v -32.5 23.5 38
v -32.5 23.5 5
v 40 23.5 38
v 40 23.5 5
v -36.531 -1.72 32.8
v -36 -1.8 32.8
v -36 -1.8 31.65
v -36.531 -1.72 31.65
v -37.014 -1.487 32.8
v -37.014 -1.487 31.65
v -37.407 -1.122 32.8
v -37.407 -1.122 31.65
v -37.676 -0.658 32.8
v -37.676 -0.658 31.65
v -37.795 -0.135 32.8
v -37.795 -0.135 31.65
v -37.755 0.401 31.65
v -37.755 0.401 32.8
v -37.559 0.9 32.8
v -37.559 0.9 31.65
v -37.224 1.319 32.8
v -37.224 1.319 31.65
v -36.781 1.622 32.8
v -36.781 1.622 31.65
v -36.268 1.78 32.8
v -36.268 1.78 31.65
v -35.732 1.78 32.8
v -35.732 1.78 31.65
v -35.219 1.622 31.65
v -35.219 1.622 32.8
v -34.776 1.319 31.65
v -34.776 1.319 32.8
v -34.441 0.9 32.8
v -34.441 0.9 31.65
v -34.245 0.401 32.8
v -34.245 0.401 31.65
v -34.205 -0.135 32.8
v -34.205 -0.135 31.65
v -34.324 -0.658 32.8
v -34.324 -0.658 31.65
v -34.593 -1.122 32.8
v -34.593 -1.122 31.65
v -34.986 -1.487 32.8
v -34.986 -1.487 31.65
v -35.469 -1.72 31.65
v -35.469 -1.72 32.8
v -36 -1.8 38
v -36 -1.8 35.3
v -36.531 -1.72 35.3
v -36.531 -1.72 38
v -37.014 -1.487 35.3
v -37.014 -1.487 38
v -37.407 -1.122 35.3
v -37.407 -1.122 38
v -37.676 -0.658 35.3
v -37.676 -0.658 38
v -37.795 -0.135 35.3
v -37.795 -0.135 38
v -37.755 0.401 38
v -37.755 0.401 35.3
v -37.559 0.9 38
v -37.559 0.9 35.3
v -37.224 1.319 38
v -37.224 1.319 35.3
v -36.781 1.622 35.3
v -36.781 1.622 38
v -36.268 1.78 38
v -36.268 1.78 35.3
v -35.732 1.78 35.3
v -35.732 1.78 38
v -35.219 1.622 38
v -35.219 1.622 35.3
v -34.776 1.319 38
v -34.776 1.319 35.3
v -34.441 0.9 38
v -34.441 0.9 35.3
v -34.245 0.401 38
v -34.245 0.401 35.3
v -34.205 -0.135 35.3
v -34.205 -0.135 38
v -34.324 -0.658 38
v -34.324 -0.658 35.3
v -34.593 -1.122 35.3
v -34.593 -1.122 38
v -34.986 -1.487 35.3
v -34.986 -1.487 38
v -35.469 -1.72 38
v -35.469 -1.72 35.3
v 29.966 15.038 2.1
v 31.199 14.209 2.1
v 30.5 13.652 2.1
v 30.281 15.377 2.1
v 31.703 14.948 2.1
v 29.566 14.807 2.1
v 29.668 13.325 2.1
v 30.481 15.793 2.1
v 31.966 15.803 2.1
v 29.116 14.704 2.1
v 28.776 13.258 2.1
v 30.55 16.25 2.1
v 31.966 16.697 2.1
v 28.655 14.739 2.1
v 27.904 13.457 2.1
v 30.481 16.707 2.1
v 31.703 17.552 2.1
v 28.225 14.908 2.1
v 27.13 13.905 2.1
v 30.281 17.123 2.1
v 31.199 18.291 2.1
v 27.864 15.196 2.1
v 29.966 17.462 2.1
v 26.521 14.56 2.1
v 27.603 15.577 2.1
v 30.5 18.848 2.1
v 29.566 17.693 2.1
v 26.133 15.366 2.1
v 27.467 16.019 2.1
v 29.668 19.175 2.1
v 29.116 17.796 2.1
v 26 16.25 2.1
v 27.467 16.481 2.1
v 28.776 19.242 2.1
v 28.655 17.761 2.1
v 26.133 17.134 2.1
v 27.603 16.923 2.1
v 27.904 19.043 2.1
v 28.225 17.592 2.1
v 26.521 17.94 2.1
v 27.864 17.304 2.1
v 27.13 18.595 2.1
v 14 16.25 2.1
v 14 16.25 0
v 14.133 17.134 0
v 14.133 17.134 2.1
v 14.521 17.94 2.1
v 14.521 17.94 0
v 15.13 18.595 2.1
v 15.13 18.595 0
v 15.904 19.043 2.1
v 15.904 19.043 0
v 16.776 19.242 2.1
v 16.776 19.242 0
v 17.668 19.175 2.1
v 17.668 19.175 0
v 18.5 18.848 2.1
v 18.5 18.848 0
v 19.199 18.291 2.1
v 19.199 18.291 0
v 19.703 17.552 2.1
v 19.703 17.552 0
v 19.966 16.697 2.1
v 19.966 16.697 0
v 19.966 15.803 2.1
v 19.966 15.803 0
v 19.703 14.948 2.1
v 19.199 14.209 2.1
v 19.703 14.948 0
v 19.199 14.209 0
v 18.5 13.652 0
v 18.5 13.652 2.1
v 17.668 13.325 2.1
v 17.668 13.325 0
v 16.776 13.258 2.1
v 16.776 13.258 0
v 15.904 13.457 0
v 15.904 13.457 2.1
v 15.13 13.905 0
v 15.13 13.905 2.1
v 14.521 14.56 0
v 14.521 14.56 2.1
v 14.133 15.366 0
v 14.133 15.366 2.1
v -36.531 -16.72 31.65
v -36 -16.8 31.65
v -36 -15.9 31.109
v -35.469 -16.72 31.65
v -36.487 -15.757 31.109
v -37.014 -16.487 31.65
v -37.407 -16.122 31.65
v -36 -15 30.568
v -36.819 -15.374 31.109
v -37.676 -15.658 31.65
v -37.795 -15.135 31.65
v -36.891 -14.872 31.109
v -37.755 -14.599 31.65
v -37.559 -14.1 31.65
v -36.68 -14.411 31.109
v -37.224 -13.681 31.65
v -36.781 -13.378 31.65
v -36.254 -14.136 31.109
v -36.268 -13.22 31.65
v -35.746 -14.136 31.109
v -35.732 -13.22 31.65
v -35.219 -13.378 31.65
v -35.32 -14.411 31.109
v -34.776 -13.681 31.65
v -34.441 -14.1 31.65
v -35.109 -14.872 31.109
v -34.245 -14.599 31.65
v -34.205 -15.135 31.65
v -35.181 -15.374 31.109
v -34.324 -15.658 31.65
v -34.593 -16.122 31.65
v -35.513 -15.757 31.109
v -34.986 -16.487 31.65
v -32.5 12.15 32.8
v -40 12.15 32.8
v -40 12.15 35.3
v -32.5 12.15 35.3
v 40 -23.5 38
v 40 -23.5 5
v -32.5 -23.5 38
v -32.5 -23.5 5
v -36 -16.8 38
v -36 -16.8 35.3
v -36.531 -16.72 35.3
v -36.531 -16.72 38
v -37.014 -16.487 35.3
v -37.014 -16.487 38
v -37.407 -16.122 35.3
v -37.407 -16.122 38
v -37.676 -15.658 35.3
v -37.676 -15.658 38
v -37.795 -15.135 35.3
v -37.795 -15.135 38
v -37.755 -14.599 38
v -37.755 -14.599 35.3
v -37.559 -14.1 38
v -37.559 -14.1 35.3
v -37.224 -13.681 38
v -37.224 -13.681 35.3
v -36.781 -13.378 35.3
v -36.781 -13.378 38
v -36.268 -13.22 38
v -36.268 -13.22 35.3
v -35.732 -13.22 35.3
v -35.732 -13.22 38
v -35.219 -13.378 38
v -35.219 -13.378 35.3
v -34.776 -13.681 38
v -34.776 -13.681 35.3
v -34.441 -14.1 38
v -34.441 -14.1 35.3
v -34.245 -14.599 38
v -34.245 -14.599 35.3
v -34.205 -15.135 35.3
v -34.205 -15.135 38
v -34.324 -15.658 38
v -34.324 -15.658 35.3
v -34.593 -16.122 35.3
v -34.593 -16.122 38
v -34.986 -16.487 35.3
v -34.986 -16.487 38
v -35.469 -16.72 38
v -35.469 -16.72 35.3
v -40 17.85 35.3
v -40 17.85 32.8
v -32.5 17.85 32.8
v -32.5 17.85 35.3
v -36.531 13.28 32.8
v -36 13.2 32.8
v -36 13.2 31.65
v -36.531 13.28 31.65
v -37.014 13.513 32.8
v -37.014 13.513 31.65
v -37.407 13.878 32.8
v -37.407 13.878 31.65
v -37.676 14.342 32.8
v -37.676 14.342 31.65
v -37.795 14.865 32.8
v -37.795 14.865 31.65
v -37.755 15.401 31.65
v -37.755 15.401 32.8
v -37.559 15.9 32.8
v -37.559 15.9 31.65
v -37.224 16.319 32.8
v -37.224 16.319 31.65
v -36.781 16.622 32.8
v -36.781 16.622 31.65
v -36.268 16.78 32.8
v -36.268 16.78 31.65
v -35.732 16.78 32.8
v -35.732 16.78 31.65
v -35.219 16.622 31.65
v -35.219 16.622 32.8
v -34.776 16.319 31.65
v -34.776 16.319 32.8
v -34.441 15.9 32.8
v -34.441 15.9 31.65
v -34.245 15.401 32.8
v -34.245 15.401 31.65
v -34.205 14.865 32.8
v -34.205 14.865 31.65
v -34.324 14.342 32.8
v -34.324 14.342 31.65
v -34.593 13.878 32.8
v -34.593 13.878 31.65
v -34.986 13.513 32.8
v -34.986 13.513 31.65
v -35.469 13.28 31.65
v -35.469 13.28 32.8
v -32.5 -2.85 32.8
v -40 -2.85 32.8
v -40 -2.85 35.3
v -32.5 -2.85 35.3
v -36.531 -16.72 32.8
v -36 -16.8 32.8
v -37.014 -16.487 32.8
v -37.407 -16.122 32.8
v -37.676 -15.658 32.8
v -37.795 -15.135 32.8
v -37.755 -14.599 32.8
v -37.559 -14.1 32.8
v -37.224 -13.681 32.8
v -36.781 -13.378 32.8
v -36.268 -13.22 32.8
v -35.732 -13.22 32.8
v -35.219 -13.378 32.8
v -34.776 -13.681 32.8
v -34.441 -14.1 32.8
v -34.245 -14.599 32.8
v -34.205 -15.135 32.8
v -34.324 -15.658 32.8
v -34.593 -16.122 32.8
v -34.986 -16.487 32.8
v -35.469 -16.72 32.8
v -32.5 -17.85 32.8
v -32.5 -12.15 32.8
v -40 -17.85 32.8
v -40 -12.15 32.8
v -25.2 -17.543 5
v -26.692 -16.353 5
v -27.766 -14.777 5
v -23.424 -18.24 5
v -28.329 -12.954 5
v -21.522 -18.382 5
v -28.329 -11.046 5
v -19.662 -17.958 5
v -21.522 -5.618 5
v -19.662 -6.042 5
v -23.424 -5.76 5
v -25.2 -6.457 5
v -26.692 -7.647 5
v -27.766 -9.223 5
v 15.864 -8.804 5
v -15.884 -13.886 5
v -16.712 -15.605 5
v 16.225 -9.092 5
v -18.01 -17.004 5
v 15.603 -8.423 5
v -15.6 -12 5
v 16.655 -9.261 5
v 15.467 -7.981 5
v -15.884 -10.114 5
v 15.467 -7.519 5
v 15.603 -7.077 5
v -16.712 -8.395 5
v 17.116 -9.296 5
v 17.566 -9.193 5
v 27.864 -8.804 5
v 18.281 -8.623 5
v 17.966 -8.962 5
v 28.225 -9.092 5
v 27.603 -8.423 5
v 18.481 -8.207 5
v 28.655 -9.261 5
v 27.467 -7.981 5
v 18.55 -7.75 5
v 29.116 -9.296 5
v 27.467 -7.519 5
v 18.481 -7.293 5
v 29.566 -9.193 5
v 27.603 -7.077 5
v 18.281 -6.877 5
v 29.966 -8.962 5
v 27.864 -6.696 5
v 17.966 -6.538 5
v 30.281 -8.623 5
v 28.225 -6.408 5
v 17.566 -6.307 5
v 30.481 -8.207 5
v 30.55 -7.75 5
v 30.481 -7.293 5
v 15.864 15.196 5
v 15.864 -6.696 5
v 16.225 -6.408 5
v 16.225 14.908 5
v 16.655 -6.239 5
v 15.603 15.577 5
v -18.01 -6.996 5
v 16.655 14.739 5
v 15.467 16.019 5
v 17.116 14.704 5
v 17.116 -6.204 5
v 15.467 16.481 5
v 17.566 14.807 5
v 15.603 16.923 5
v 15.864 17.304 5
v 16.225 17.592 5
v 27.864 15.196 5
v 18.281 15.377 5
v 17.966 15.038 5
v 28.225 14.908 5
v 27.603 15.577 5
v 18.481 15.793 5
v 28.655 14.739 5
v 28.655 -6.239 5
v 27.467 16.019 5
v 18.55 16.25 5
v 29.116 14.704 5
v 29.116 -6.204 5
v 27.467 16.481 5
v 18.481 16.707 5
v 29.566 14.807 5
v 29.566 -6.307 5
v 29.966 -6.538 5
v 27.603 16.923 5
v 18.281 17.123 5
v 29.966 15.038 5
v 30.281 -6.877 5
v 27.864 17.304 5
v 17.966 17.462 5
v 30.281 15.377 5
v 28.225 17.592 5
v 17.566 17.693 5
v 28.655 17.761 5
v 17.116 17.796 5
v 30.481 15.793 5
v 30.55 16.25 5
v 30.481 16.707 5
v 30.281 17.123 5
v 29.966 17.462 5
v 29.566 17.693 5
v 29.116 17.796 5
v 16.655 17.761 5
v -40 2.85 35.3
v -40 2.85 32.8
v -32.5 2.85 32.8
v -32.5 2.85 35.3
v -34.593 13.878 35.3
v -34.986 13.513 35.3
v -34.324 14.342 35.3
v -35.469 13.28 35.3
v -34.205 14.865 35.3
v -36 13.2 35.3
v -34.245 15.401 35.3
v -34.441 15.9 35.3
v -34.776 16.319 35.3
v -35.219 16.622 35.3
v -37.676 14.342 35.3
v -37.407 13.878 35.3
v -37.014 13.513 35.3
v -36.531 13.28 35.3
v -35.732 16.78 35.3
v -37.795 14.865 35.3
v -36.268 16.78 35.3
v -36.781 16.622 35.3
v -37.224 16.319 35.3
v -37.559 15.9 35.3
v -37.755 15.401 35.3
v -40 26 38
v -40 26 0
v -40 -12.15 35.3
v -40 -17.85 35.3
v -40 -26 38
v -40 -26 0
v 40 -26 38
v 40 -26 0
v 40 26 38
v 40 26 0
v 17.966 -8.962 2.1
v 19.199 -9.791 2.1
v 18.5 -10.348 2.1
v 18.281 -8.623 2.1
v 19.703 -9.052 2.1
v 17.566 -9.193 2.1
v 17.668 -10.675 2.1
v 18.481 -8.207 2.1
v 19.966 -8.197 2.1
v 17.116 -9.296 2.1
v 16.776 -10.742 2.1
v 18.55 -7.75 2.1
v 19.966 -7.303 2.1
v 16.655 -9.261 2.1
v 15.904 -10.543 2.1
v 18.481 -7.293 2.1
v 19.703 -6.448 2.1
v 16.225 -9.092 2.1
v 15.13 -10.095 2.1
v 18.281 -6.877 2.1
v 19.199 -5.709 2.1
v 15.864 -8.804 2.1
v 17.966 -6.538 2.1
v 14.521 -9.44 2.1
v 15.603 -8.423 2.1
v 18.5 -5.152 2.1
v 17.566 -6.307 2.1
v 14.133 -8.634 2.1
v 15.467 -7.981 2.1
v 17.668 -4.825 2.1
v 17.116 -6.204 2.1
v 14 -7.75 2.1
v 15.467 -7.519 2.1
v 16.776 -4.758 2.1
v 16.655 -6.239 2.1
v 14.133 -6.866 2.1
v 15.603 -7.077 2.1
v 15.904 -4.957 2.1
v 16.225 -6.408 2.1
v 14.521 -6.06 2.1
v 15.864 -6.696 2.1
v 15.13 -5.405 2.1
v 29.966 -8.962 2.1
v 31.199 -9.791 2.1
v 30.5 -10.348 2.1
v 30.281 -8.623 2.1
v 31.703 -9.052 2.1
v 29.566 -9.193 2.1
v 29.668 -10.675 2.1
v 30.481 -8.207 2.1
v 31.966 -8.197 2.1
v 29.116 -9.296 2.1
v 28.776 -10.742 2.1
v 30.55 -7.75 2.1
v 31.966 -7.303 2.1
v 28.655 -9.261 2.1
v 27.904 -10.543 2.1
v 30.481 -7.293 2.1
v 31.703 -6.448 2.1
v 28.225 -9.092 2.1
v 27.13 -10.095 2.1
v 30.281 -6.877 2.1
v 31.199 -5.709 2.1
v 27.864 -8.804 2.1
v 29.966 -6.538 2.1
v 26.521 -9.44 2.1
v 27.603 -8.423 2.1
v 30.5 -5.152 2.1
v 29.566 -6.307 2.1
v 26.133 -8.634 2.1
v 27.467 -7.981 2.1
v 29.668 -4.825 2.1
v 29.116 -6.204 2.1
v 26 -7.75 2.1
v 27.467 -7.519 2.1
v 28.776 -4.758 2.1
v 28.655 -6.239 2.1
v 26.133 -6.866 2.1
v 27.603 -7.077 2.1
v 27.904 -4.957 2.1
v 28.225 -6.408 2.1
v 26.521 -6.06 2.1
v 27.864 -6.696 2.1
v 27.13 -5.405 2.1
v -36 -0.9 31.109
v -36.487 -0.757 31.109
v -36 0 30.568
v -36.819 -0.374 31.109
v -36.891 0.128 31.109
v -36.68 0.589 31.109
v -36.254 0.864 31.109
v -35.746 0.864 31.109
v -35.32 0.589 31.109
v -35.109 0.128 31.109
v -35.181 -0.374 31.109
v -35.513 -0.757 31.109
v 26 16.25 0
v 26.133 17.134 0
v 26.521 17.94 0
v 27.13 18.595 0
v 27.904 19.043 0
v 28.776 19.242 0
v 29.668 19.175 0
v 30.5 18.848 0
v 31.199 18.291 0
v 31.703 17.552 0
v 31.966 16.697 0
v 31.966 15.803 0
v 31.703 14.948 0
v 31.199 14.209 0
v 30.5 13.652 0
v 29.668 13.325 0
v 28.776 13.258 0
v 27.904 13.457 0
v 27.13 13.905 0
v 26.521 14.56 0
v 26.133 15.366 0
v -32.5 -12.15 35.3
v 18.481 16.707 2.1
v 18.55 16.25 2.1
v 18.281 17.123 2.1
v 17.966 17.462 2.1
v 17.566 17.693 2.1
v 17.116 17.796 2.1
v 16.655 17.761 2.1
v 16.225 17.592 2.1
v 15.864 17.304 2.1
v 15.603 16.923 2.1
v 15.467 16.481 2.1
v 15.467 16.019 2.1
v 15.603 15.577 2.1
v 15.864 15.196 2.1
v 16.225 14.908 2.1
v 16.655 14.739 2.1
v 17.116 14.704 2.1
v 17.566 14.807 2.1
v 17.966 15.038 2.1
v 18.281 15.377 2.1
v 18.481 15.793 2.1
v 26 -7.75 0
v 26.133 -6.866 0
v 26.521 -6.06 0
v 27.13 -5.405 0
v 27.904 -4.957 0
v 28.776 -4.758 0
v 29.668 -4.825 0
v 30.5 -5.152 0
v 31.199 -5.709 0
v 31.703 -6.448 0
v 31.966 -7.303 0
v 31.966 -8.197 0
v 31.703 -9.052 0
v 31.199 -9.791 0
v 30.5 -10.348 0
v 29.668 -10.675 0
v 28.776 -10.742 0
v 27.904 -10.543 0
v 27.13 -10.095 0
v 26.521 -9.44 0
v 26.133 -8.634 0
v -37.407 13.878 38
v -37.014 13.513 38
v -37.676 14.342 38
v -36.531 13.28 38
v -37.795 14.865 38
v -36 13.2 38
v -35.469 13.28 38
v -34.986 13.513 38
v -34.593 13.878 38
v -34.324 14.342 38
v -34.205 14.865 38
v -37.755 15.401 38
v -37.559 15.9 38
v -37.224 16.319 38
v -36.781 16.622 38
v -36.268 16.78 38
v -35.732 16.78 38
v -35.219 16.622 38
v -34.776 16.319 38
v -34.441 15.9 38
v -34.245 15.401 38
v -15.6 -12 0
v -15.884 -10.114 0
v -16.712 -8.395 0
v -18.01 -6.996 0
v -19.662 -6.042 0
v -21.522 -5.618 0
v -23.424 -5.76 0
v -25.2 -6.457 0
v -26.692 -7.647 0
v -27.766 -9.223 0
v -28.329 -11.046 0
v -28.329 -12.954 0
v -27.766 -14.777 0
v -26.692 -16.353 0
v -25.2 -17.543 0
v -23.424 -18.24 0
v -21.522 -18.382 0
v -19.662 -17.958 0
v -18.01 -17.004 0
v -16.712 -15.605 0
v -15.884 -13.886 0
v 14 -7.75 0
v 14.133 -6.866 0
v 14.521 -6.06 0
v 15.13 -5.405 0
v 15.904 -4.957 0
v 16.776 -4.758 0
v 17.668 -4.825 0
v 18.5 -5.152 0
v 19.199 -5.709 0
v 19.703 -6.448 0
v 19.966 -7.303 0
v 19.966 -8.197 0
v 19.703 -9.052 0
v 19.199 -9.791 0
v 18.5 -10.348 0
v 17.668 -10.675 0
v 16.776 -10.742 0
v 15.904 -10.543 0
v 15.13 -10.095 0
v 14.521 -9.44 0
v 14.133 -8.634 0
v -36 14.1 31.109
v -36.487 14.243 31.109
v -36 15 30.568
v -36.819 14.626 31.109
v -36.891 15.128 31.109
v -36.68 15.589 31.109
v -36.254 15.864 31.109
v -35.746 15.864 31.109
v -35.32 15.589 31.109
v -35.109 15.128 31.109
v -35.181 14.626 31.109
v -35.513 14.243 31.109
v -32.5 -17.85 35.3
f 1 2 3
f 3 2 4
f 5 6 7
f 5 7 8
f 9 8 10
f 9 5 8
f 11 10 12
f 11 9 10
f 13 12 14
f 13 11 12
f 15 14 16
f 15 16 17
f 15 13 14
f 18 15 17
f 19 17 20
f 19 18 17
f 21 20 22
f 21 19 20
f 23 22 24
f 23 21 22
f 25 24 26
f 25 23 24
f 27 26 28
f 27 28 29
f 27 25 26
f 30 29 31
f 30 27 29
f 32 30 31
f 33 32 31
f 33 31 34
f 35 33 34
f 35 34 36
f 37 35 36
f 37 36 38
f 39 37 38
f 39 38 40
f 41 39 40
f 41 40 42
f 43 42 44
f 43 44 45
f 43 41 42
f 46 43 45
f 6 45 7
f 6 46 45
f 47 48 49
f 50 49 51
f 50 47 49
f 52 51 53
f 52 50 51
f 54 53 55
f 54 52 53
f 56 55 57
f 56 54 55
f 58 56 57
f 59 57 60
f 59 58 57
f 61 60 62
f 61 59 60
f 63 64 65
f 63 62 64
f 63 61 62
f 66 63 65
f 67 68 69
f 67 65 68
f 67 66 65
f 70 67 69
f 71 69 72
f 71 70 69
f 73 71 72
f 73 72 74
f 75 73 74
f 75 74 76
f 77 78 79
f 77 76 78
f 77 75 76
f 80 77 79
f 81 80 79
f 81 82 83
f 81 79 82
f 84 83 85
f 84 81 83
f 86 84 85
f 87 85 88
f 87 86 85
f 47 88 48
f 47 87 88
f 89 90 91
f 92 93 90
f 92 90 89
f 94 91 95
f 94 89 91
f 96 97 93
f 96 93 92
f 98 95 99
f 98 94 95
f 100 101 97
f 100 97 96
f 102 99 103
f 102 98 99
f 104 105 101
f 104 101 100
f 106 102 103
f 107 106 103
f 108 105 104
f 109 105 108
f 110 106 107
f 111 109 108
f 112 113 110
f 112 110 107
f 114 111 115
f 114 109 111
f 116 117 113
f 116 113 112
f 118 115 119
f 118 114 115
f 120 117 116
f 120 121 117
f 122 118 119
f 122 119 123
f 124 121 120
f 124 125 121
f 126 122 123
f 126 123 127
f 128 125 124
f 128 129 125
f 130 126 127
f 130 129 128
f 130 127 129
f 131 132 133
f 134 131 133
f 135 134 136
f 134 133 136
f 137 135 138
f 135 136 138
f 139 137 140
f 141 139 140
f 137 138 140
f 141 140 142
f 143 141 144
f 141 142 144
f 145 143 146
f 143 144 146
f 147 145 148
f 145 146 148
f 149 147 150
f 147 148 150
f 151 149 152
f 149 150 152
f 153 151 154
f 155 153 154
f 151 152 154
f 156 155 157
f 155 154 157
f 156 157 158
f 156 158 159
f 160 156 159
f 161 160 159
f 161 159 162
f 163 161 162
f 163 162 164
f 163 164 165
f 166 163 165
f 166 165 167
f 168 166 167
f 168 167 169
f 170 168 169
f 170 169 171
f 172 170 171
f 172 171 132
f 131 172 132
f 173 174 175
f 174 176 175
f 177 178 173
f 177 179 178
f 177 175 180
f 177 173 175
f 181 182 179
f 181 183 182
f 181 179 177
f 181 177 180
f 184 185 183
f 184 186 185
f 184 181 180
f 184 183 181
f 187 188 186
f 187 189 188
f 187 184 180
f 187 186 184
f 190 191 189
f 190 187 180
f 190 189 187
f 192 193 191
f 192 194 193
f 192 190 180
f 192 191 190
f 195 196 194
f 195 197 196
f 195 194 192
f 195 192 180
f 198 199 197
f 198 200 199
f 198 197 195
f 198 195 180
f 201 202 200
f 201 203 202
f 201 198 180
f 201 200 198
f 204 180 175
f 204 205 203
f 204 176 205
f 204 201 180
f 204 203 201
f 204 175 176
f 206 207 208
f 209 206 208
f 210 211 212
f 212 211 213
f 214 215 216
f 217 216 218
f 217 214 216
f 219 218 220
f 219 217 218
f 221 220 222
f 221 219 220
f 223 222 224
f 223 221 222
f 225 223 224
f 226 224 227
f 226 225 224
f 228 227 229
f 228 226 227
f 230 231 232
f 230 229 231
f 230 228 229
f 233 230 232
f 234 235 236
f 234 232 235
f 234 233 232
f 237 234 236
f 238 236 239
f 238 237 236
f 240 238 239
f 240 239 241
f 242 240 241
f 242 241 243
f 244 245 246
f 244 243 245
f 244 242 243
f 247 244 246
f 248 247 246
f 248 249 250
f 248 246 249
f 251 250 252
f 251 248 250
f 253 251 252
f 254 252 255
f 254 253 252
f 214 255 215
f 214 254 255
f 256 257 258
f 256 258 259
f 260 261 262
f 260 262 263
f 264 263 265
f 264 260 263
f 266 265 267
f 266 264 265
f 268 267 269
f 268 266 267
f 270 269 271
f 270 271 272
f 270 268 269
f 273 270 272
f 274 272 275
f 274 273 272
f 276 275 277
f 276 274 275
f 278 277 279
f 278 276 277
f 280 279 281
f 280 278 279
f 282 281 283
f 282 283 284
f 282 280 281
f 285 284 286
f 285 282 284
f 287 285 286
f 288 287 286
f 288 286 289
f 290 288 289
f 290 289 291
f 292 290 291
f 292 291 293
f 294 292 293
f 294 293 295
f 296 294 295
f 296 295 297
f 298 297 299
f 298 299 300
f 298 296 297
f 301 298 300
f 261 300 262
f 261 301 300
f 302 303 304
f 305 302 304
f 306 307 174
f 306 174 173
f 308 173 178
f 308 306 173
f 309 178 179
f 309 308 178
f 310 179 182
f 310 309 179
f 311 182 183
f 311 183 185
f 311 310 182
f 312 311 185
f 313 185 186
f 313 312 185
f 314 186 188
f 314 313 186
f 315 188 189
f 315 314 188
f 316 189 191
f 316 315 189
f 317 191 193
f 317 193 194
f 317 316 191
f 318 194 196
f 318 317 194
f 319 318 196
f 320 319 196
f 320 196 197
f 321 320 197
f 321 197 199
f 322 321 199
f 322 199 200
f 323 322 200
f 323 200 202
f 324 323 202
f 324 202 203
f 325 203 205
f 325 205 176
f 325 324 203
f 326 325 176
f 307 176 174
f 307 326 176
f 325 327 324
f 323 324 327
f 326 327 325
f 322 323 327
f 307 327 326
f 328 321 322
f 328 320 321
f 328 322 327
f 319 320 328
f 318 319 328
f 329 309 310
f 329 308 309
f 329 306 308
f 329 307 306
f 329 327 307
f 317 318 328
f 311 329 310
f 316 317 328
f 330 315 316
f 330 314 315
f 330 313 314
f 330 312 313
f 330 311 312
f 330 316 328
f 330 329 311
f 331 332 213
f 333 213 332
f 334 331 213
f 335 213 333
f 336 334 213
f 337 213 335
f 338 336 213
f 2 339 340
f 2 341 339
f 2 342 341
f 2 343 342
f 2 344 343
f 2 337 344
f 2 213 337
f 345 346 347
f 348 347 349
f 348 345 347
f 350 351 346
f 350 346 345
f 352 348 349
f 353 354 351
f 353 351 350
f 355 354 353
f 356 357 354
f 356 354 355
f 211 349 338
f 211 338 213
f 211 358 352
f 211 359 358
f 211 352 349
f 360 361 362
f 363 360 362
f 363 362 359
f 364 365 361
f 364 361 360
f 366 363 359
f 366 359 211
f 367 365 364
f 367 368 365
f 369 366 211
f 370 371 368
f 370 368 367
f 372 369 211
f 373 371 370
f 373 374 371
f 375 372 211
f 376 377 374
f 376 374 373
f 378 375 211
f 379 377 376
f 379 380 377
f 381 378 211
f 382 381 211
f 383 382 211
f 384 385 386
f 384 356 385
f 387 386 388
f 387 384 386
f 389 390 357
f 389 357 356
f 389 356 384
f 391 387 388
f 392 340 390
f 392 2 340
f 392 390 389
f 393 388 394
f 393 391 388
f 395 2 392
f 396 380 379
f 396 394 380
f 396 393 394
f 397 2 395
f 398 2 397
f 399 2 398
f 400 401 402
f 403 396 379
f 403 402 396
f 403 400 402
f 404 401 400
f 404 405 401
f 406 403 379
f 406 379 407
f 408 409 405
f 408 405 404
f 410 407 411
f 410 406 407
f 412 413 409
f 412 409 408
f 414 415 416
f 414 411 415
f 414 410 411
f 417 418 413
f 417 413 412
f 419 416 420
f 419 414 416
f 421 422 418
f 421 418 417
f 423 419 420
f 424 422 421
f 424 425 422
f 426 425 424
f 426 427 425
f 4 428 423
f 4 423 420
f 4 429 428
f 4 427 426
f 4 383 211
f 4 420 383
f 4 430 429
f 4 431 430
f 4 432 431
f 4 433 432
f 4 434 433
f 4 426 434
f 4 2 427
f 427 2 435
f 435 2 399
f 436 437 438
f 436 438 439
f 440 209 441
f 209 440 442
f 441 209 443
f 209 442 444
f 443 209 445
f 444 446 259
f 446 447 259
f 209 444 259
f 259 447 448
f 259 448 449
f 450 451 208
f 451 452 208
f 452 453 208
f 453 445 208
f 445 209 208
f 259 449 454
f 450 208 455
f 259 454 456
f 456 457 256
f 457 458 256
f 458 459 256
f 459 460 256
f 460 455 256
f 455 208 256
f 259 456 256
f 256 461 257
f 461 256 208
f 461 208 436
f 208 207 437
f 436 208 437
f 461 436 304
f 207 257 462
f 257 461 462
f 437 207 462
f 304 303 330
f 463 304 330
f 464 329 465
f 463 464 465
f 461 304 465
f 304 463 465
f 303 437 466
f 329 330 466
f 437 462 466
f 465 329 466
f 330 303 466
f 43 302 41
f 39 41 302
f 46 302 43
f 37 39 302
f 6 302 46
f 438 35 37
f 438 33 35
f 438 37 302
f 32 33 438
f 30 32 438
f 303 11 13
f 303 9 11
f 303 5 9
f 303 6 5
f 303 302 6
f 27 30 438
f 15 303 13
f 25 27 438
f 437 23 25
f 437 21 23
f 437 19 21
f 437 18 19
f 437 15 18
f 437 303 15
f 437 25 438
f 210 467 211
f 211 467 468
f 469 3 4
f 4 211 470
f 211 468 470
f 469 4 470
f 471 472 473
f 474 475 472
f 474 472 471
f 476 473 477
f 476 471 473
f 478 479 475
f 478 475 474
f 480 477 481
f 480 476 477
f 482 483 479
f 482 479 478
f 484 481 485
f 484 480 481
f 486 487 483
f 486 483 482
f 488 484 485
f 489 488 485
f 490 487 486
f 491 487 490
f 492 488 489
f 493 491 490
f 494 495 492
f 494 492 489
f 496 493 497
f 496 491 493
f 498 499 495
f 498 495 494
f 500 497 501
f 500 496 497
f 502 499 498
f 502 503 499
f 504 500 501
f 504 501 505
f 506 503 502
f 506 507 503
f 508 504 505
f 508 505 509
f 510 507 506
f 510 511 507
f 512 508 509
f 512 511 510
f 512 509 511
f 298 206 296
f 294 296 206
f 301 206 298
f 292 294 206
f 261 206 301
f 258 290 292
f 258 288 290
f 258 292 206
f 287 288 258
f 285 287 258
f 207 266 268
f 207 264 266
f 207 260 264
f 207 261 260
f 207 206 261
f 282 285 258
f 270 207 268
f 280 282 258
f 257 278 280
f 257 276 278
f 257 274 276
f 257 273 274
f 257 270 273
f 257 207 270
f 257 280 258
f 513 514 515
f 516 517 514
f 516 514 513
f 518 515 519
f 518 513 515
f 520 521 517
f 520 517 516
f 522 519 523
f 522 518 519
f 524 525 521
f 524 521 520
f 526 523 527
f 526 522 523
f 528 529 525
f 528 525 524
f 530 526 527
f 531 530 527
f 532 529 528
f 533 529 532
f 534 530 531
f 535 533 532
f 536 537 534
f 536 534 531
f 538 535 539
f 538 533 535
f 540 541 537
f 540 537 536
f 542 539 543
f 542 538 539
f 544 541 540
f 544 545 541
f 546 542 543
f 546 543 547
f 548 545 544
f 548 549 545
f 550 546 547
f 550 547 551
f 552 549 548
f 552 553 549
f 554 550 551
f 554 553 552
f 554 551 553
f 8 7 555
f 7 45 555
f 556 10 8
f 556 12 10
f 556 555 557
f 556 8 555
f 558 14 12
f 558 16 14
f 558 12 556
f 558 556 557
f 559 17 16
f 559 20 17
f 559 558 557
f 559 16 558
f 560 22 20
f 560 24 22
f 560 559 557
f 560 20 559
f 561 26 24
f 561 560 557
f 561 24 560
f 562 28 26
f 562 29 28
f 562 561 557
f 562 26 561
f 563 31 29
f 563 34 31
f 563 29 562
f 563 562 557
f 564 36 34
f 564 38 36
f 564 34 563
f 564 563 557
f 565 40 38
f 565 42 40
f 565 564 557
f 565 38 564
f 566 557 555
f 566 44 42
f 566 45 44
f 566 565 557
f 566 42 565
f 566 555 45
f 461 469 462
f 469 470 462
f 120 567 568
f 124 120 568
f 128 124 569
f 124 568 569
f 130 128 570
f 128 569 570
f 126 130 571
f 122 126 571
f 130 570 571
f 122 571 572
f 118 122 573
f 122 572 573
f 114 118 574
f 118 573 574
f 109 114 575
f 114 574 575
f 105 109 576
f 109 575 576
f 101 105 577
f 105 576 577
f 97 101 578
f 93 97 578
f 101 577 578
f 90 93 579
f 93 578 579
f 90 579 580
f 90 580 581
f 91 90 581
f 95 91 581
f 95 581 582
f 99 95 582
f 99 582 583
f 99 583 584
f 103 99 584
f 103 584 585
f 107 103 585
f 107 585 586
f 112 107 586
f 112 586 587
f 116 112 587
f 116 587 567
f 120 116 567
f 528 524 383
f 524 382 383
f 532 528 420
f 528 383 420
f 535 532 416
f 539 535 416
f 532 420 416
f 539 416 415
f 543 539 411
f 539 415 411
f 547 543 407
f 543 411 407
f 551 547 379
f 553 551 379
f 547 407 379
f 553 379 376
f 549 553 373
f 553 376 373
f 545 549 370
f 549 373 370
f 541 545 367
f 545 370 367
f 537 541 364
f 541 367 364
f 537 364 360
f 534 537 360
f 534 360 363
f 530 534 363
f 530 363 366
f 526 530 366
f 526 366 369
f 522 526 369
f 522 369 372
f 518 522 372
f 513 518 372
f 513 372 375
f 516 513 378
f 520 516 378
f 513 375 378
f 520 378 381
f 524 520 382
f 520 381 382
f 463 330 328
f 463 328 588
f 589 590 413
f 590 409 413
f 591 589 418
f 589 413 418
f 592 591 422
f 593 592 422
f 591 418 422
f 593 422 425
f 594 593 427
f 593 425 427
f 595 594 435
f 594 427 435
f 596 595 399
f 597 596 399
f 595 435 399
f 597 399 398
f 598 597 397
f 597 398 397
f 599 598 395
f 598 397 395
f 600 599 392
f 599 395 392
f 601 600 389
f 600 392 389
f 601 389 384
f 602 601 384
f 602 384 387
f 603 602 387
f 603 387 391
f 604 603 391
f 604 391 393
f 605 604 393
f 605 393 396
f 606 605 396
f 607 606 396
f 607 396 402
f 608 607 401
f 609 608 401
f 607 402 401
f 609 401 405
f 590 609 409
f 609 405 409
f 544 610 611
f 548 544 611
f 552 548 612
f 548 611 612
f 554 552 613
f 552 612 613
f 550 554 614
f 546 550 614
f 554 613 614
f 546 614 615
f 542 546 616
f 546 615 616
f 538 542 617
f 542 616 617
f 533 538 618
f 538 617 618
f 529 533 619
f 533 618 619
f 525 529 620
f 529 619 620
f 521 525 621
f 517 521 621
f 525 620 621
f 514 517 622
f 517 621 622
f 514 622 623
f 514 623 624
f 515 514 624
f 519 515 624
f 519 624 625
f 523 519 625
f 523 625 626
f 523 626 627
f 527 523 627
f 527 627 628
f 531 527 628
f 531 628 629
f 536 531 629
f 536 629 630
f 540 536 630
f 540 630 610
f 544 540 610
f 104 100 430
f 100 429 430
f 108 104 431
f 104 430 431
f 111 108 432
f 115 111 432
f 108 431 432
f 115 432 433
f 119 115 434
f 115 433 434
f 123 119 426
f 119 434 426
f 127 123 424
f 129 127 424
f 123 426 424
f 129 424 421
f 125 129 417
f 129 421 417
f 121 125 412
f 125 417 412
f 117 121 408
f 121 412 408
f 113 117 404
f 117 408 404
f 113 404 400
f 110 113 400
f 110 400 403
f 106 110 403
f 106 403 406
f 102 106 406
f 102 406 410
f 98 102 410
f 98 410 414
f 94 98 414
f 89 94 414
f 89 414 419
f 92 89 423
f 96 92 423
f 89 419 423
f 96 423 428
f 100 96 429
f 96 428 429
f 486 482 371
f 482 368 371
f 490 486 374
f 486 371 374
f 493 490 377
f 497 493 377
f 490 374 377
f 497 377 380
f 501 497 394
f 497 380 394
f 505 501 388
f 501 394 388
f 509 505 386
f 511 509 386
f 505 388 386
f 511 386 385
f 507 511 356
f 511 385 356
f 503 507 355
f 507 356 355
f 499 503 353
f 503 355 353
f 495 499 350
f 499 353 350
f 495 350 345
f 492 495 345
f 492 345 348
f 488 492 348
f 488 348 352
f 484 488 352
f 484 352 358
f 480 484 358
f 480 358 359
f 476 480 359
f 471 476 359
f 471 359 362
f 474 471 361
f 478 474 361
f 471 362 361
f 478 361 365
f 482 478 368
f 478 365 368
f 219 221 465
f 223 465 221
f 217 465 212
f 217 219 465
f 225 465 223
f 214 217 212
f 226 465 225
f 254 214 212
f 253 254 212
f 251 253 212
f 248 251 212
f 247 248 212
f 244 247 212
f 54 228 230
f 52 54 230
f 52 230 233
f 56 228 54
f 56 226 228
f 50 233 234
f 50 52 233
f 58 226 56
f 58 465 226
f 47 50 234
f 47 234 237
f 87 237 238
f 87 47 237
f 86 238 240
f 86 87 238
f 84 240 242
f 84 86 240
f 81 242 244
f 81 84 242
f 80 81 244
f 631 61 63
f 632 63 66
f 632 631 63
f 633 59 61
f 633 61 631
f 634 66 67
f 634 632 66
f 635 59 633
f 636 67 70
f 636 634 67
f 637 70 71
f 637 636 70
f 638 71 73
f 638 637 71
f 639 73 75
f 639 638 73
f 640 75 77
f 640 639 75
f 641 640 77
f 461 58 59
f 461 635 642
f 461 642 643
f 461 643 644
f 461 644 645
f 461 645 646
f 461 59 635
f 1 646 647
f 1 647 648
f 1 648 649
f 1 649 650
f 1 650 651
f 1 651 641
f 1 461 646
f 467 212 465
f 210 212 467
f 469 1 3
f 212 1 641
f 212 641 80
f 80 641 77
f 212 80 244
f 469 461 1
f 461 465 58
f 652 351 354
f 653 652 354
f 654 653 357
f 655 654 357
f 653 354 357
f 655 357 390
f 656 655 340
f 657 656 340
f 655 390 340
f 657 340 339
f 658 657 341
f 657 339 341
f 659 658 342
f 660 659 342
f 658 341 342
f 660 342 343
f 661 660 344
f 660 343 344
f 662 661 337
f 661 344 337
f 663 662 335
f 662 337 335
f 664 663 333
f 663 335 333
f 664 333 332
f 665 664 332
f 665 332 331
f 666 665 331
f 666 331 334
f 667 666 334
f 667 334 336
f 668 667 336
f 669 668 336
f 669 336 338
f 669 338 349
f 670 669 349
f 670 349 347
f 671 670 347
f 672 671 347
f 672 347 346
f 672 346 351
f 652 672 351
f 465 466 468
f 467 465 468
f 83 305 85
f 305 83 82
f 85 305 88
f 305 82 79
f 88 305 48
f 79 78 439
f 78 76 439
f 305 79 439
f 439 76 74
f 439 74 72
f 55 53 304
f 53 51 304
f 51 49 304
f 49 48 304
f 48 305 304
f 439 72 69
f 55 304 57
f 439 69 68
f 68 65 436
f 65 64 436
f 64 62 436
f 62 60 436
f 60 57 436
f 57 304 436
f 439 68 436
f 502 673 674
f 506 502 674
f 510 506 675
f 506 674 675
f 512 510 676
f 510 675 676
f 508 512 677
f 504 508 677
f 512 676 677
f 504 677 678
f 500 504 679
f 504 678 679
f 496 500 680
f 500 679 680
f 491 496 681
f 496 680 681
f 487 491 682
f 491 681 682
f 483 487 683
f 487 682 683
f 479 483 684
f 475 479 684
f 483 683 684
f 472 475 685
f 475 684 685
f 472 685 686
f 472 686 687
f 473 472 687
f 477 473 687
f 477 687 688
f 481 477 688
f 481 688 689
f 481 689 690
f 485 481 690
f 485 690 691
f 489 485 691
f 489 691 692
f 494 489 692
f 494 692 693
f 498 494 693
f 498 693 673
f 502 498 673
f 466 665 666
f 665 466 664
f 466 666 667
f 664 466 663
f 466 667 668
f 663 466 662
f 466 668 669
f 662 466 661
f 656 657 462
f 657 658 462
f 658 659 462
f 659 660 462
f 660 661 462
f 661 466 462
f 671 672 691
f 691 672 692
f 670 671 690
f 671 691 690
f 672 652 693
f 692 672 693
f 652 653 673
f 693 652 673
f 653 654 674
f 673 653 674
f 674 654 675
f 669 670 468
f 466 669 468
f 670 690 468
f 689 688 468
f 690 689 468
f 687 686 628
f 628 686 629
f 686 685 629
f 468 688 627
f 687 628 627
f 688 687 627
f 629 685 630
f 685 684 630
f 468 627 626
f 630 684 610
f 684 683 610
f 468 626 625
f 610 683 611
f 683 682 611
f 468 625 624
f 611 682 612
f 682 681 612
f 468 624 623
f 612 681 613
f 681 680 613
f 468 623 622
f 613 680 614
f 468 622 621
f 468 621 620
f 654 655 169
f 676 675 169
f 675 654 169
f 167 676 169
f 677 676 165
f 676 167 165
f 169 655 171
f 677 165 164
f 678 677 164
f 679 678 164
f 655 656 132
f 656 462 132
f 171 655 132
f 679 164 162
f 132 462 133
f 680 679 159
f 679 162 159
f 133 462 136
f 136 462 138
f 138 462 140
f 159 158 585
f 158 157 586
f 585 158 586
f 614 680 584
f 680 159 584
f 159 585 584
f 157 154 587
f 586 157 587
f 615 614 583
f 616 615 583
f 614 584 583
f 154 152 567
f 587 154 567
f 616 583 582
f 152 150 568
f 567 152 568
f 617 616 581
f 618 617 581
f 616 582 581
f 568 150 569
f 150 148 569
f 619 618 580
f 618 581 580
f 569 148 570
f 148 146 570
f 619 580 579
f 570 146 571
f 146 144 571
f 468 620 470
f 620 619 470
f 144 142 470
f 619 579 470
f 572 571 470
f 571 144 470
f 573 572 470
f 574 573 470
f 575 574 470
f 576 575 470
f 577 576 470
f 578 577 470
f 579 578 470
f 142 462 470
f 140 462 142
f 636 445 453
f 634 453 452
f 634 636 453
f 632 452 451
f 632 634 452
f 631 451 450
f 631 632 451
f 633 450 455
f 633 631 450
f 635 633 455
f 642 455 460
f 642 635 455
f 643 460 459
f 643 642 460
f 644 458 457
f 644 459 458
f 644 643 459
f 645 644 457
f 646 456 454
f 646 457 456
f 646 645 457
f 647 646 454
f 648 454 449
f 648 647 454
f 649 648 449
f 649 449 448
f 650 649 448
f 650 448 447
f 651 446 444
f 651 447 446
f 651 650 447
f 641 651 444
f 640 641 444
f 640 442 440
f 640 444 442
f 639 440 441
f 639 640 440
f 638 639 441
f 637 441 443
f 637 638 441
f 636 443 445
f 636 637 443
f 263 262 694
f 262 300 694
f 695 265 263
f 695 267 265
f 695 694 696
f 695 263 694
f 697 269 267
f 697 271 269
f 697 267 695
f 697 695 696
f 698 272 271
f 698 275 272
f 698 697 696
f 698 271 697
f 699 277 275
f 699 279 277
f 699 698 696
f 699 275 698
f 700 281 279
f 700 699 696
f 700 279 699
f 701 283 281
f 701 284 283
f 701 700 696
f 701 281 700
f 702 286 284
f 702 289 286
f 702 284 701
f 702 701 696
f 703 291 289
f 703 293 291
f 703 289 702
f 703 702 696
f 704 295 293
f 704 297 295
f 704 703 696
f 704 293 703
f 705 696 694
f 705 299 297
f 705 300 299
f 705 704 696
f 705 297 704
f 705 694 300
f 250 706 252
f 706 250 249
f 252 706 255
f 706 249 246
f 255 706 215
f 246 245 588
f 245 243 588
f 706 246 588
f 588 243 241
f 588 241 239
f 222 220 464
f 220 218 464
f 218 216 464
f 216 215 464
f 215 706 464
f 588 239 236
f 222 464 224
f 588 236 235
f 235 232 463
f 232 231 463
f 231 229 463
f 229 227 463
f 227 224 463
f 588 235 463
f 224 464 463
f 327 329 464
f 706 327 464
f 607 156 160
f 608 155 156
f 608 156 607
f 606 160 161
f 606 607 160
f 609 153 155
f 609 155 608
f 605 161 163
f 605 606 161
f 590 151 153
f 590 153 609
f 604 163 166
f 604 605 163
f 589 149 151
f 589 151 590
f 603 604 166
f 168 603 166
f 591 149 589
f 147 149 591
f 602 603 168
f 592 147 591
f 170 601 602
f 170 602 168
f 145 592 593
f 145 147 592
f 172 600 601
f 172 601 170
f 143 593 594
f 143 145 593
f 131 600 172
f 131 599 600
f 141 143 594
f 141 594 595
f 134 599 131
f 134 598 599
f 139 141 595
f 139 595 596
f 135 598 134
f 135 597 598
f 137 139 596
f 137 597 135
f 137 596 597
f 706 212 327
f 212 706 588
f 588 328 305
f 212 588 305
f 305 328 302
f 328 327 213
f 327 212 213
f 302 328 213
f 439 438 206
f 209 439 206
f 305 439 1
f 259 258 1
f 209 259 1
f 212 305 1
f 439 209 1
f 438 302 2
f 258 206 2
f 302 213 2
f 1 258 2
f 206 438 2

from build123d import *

# Parameters (mm, degrees)
ESQUISSE3_W                                        = 80
ESQUISSE3_H                                        = 52
BOSS_EXTRU_1_DEPTH                                 = 5
ESQUISSE4_R                                        = 6.4
ENL_V_MAT_EXTRU_1_DEPTH                            = 10
BOSS_EXTRU_2_DEPTH                                 = 33
CHAMBRAGE_POUR_VIS_T_TE_RONDE_BOMB_E_M_D           = 3.1
CHAMBRAGE_POUR_VIS_T_TE_RONDE_BOMB_E_M_CBORE_D     = 6
CHAMBRAGE_POUR_VIS_T_TE_RONDE_BOMB_E_M_CBORE_DEPTH = 2.1
R_P_TITION_LIN_AIRE1_COUNT                         = 2
R_P_TITION_LIN_AIRE1_PITCH                         = 12
R_P_TITION_LIN_AIRE1_COUNT_DIR2                    = 2
R_P_TITION_LIN_AIRE1_PITCH_DIR2                    = 24
ENL_V_MAT_EXTRU_2_REACH                            = 94.304
ESQUISSE11_W                                       = 2.5
ESQUISSE11_H                                       = 5.7
R_P_TITION_LIN_AIRE2_COUNT                         = 3
R_P_TITION_LIN_AIRE2_PITCH                         = 15
R_P_TITION_LIN_AIRE3_COUNT                         = 3
R_P_TITION_LIN_AIRE3_PITCH                         = 15


with BuildPart() as part:
    # Esquisse3 → Boss.-Extru.1 (new body)
    with BuildSketch(Plane.XY):
        Rectangle(ESQUISSE3_W, ESQUISSE3_H)
    extrude(amount=BOSS_EXTRU_1_DEPTH)

    # Esquisse4 → Enlèv. mat.-Extru.1 (cut)
    with BuildSketch(Plane.XY.offset(5)):
        with Locations((-22, -12)):
            Circle(ESQUISSE4_R)
    extrude(amount=-ENL_V_MAT_EXTRU_1_DEPTH, mode=Mode.SUBTRACT)

    # Esquisse5 → Boss.-Extru.2 (add)
    with BuildSketch(Plane.XY.offset(5)):
        Polygon((-40, -26), (40, -26), (40, -23.5), (-32.5, -23.5), (-32.5, 23.5), (40, 23.5), (40, 26), (-40, 26), align=None)
    extrude(amount=BOSS_EXTRU_2_DEPTH)

    # Chambrage pour vis à tête ronde bombée M2.51 (through all)
    with Locations(Plane(origin=(0, 0, 0), x_dir=(-1, 0, 0), z_dir=(0, 0, -1))):
        with Locations((-17, 16.25)):
            chambrage_pour_vis_t_te_ronde_bomb_e_m = CounterBoreHole(CHAMBRAGE_POUR_VIS_T_TE_RONDE_BOMB_E_M_D / 2, CHAMBRAGE_POUR_VIS_T_TE_RONDE_BOMB_E_M_CBORE_D / 2, CHAMBRAGE_POUR_VIS_T_TE_RONDE_BOMB_E_M_CBORE_DEPTH)

    # Répétition linéaire1: Chambrage pour vis _ t_te ronde bomb_e M 2 × 2
    with Locations(*[(i * R_P_TITION_LIN_AIRE1_PITCH, -j * R_P_TITION_LIN_AIRE1_PITCH_DIR2, 0) for i in range(R_P_TITION_LIN_AIRE1_COUNT) for j in range(R_P_TITION_LIN_AIRE1_COUNT_DIR2) if (i, j) != (0, 0)]):
        add(chambrage_pour_vis_t_te_ronde_bomb_e_m, mode=Mode.SUBTRACT)

    # Esquisse11 → Enlèv. mat.-Extru.2 (cut, up to next)
    with BuildSketch(Plane.ZY.offset(40), mode=Mode.PRIVATE) as enl_v_mat_extru_2_sk1:
        with Locations((34.05, 15)):
            Rectangle(ESQUISSE11_W, ESQUISSE11_H)
    enl_v_mat_extru_2_tool1 = extrude(enl_v_mat_extru_2_sk1.sketch, amount=-ENL_V_MAT_EXTRU_2_REACH, mode=Mode.PRIVATE) & part.part
    enl_v_mat_extru_2 = enl_v_mat_extru_2_tool1.solids().sort_by_distance((-40, 15, 34.05))[0]
    add(enl_v_mat_extru_2, mode=Mode.SUBTRACT)

    # Répétition linéaire2: Enlèv. mat.-Extru.2 ×3
    with Locations(*[(0, -i * R_P_TITION_LIN_AIRE2_PITCH, 0) for i in range(1, R_P_TITION_LIN_AIRE2_COUNT)]):
        add(enl_v_mat_extru_2, mode=Mode.SUBTRACT)

    # Esquisse15 → Dégagement M31 (revolve, cut)
    with BuildSketch(Plane(origin=(-36, 15, 38), x_dir=(0, -1, 0), z_dir=(1, 0, 0))):
        Polygon((0, 0), (0, 7.431549114), (1.8, 6.35), (1.8, 0), align=None)
    d_gagement_m31 = revolve(axis=Axis((-36, 15, 44.35), (0, 0, -1)), mode=Mode.SUBTRACT)

    # Répétition linéaire3: Dégagement M31 ×3
    with Locations(*[(0, -i * R_P_TITION_LIN_AIRE3_PITCH, 0) for i in range(1, R_P_TITION_LIN_AIRE3_COUNT)]):
        add(d_gagement_m31, mode=Mode.SUBTRACT)


solid = part.part
